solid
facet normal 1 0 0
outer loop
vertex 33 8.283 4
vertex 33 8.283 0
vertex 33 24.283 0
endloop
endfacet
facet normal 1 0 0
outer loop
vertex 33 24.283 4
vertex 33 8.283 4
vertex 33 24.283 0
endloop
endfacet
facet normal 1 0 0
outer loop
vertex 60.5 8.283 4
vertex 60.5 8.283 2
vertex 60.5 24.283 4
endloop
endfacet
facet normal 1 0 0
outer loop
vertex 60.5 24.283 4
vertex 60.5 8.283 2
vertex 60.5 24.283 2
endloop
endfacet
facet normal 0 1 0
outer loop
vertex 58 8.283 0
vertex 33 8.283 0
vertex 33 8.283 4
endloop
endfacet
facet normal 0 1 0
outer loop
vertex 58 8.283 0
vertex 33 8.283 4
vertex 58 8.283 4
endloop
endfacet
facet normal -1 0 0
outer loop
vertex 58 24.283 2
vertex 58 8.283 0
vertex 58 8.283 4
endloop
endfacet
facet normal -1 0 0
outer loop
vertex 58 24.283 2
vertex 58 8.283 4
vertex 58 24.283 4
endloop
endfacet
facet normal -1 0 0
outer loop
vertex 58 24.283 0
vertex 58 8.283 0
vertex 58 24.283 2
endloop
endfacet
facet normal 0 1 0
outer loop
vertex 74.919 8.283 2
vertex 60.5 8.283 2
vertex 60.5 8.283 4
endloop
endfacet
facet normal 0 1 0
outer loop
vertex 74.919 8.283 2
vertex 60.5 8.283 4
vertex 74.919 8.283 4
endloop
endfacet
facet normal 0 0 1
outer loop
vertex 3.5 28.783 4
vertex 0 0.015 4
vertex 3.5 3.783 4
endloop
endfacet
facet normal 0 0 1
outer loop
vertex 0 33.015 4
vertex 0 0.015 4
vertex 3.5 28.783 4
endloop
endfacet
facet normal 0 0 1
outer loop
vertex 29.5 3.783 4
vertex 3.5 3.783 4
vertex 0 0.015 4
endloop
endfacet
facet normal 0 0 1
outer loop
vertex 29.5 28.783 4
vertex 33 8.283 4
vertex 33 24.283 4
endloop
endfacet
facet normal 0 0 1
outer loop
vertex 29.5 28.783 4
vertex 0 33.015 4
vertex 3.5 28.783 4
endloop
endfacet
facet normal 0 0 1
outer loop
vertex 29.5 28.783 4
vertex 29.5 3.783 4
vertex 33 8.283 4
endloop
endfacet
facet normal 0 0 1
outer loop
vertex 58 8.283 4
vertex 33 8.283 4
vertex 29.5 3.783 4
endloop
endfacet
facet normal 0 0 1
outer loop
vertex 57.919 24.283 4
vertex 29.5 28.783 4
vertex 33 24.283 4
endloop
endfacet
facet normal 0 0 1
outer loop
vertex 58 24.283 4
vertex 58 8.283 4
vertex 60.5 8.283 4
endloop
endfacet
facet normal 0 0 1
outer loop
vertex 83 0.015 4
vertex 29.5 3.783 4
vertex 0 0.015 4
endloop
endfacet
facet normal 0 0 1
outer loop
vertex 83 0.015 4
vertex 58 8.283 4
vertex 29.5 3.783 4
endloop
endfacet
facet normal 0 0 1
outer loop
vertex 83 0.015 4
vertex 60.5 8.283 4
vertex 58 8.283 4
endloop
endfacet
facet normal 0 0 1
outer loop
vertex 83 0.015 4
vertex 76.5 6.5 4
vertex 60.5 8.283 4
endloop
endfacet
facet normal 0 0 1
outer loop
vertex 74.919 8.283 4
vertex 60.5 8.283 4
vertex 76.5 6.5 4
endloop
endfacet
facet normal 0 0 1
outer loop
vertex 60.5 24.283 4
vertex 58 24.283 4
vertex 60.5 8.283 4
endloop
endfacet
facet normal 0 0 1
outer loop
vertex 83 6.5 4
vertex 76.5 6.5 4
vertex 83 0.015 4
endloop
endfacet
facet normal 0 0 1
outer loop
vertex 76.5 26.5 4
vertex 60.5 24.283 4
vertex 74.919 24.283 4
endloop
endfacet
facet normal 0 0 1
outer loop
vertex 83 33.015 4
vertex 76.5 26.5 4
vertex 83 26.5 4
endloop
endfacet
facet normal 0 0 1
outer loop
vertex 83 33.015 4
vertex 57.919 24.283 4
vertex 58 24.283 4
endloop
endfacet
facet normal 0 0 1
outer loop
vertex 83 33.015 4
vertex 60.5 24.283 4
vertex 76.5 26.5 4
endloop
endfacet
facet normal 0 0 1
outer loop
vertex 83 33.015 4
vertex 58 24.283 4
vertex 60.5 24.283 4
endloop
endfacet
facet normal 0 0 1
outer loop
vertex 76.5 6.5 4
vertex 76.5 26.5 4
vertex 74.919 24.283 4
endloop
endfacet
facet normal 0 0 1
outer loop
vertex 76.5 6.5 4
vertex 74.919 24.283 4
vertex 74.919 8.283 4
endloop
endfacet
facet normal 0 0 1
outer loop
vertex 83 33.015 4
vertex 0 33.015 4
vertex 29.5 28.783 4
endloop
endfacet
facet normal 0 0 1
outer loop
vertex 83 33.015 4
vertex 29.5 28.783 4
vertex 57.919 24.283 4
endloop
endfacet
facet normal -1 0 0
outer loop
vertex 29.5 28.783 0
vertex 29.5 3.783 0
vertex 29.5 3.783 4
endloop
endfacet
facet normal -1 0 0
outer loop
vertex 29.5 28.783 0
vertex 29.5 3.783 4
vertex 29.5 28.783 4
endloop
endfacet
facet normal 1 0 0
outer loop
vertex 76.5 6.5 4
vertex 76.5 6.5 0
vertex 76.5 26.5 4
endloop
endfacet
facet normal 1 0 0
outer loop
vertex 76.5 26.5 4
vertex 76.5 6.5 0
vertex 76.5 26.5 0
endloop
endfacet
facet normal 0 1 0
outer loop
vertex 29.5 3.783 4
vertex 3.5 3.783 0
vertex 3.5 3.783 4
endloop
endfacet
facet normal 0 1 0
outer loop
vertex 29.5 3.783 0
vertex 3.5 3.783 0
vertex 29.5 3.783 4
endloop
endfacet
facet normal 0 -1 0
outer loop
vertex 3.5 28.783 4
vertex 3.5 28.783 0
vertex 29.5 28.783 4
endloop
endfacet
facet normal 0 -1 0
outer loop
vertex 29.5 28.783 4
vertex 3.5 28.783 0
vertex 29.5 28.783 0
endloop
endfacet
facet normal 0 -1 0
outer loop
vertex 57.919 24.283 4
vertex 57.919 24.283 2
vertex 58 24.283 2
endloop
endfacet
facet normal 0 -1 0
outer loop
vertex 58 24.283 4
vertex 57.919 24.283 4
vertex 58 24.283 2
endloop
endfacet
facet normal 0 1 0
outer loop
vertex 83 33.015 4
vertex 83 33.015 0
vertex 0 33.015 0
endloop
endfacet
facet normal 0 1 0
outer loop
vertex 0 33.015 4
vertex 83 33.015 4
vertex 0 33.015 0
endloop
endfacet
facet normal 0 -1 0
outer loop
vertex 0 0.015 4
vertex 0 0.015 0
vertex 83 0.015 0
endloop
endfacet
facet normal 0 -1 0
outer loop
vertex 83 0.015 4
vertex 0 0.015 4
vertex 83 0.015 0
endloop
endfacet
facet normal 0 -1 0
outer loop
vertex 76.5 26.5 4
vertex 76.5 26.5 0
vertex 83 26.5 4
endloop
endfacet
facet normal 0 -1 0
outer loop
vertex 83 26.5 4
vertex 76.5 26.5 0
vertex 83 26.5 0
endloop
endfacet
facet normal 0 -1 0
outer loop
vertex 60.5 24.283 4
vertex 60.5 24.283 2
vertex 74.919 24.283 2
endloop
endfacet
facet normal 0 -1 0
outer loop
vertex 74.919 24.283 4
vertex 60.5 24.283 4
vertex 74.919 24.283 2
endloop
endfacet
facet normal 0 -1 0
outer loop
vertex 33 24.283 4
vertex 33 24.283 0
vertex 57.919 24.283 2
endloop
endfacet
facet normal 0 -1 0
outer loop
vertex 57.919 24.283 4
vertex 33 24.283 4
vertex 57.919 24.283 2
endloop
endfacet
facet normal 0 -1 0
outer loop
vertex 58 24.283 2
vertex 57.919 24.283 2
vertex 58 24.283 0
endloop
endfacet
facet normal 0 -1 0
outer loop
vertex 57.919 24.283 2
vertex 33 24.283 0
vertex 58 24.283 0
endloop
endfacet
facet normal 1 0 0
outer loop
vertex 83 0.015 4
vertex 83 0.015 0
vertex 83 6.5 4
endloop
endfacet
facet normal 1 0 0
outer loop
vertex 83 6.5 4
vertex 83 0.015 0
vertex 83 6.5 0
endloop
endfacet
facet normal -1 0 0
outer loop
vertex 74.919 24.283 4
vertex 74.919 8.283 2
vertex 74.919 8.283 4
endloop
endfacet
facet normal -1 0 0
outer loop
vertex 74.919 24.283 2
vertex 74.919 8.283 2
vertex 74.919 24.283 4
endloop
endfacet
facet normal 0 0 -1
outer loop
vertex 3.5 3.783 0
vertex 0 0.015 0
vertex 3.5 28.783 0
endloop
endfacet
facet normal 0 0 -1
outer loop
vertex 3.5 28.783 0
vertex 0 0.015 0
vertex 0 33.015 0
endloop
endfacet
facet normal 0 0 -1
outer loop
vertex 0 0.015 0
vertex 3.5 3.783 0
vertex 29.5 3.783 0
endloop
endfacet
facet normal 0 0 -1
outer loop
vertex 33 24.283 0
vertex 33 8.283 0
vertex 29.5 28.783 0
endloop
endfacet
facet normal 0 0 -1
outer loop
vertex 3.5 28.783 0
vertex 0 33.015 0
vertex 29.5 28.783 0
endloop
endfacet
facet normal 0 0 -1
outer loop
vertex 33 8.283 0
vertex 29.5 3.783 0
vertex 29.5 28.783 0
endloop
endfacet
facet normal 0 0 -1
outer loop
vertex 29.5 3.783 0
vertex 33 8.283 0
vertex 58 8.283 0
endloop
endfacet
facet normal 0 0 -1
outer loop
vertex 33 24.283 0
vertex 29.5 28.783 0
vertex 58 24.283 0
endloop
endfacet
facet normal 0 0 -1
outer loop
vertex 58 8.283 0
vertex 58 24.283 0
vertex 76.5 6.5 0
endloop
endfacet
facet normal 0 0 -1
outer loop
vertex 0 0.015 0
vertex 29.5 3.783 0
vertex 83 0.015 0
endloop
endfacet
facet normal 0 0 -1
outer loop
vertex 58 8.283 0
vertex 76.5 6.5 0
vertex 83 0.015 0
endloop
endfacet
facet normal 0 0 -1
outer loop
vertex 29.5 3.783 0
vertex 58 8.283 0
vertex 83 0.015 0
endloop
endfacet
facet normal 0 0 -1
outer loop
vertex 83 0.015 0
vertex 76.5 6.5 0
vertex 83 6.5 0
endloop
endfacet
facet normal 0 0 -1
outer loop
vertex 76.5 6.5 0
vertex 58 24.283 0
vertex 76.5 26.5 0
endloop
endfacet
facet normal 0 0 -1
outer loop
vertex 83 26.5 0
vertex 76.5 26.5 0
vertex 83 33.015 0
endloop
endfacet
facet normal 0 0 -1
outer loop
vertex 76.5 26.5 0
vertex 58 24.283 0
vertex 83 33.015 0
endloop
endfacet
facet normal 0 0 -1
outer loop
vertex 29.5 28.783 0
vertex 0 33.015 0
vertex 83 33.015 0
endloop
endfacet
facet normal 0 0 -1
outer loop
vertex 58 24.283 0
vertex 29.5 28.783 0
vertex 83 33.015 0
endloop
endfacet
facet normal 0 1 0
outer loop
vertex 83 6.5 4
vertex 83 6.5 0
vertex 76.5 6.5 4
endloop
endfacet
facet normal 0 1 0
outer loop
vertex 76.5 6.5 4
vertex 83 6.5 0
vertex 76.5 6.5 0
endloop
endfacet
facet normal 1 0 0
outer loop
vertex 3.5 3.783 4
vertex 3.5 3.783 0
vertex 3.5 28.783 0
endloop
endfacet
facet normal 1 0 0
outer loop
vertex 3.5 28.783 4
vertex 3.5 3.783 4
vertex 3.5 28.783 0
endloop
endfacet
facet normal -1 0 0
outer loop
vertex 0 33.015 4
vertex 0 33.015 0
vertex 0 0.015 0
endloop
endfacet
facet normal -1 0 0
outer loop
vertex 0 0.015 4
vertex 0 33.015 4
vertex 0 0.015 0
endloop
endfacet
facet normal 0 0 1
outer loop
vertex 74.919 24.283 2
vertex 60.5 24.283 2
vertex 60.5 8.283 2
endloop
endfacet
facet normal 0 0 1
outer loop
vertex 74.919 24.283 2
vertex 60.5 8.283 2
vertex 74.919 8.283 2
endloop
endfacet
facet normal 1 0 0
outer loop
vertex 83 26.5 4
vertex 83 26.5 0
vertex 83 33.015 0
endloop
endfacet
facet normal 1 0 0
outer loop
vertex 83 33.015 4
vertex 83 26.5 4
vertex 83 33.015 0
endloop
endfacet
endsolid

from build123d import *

# Parameters (mm, degrees)
SKETCH001_W  = 17
SKETCH001_H  = 16
PAD001_DEPTH = 2
SKETCH005_W  = 2.5
SKETCH005_H  = 18
PAD005_DEPTH = 4
SKETCH_W     = 26
SKETCH_H     = 25
SKETCH_W_2   = 25
SKETCH_H_2   = 16
PAD_DEPTH    = 4


with BuildPart() as cuerpo001:
    # Sketch001 → Pad001 (new body)
    with BuildSketch(Plane.XY):
        with Locations((66.419464, 16.283001)):
            Rectangle(SKETCH001_W, SKETCH001_H)
    extrude(amount=PAD001_DEPTH)


with BuildPart() as cuerpo001_1:
    # Body001 placement: moved
    add(cuerpo001.part.moved(Location((0, 0, 2))))


with BuildPart() as cuerpo005:
    # Sketch005 → Pad005 (new body)
    with BuildSketch(Plane.XY):
        with Locations((59.25, 16.380761)):
            Rectangle(SKETCH005_W, SKETCH005_H)
    extrude(amount=PAD005_DEPTH)


with BuildPart() as cuerpo:
    # Sketch → Pad (new body)
    with BuildSketch(Plane.XY):
        Polygon((0, 33.015301), (0, 0.015301), (83, 0.015301), (83, 6.5), (76.500001, 6.5), (76.500001, 26.5), (83, 26.5), (83, 33.015301), align=None)
        with Locations((16.5, 16.282843)):
            Rectangle(SKETCH_W, SKETCH_H, mode=Mode.SUBTRACT)
        with Locations((45.5, 16.282843)):
            Rectangle(SKETCH_W_2, SKETCH_H_2, mode=Mode.SUBTRACT)
    extrude(amount=PAD_DEPTH)

    # Boolean: cut Cuerpo001
    add(cuerpo001_1.part, mode=Mode.SUBTRACT)

    # Boolean001: union Cuerpo005
    add(cuerpo005.part)


solid = cuerpo.part
